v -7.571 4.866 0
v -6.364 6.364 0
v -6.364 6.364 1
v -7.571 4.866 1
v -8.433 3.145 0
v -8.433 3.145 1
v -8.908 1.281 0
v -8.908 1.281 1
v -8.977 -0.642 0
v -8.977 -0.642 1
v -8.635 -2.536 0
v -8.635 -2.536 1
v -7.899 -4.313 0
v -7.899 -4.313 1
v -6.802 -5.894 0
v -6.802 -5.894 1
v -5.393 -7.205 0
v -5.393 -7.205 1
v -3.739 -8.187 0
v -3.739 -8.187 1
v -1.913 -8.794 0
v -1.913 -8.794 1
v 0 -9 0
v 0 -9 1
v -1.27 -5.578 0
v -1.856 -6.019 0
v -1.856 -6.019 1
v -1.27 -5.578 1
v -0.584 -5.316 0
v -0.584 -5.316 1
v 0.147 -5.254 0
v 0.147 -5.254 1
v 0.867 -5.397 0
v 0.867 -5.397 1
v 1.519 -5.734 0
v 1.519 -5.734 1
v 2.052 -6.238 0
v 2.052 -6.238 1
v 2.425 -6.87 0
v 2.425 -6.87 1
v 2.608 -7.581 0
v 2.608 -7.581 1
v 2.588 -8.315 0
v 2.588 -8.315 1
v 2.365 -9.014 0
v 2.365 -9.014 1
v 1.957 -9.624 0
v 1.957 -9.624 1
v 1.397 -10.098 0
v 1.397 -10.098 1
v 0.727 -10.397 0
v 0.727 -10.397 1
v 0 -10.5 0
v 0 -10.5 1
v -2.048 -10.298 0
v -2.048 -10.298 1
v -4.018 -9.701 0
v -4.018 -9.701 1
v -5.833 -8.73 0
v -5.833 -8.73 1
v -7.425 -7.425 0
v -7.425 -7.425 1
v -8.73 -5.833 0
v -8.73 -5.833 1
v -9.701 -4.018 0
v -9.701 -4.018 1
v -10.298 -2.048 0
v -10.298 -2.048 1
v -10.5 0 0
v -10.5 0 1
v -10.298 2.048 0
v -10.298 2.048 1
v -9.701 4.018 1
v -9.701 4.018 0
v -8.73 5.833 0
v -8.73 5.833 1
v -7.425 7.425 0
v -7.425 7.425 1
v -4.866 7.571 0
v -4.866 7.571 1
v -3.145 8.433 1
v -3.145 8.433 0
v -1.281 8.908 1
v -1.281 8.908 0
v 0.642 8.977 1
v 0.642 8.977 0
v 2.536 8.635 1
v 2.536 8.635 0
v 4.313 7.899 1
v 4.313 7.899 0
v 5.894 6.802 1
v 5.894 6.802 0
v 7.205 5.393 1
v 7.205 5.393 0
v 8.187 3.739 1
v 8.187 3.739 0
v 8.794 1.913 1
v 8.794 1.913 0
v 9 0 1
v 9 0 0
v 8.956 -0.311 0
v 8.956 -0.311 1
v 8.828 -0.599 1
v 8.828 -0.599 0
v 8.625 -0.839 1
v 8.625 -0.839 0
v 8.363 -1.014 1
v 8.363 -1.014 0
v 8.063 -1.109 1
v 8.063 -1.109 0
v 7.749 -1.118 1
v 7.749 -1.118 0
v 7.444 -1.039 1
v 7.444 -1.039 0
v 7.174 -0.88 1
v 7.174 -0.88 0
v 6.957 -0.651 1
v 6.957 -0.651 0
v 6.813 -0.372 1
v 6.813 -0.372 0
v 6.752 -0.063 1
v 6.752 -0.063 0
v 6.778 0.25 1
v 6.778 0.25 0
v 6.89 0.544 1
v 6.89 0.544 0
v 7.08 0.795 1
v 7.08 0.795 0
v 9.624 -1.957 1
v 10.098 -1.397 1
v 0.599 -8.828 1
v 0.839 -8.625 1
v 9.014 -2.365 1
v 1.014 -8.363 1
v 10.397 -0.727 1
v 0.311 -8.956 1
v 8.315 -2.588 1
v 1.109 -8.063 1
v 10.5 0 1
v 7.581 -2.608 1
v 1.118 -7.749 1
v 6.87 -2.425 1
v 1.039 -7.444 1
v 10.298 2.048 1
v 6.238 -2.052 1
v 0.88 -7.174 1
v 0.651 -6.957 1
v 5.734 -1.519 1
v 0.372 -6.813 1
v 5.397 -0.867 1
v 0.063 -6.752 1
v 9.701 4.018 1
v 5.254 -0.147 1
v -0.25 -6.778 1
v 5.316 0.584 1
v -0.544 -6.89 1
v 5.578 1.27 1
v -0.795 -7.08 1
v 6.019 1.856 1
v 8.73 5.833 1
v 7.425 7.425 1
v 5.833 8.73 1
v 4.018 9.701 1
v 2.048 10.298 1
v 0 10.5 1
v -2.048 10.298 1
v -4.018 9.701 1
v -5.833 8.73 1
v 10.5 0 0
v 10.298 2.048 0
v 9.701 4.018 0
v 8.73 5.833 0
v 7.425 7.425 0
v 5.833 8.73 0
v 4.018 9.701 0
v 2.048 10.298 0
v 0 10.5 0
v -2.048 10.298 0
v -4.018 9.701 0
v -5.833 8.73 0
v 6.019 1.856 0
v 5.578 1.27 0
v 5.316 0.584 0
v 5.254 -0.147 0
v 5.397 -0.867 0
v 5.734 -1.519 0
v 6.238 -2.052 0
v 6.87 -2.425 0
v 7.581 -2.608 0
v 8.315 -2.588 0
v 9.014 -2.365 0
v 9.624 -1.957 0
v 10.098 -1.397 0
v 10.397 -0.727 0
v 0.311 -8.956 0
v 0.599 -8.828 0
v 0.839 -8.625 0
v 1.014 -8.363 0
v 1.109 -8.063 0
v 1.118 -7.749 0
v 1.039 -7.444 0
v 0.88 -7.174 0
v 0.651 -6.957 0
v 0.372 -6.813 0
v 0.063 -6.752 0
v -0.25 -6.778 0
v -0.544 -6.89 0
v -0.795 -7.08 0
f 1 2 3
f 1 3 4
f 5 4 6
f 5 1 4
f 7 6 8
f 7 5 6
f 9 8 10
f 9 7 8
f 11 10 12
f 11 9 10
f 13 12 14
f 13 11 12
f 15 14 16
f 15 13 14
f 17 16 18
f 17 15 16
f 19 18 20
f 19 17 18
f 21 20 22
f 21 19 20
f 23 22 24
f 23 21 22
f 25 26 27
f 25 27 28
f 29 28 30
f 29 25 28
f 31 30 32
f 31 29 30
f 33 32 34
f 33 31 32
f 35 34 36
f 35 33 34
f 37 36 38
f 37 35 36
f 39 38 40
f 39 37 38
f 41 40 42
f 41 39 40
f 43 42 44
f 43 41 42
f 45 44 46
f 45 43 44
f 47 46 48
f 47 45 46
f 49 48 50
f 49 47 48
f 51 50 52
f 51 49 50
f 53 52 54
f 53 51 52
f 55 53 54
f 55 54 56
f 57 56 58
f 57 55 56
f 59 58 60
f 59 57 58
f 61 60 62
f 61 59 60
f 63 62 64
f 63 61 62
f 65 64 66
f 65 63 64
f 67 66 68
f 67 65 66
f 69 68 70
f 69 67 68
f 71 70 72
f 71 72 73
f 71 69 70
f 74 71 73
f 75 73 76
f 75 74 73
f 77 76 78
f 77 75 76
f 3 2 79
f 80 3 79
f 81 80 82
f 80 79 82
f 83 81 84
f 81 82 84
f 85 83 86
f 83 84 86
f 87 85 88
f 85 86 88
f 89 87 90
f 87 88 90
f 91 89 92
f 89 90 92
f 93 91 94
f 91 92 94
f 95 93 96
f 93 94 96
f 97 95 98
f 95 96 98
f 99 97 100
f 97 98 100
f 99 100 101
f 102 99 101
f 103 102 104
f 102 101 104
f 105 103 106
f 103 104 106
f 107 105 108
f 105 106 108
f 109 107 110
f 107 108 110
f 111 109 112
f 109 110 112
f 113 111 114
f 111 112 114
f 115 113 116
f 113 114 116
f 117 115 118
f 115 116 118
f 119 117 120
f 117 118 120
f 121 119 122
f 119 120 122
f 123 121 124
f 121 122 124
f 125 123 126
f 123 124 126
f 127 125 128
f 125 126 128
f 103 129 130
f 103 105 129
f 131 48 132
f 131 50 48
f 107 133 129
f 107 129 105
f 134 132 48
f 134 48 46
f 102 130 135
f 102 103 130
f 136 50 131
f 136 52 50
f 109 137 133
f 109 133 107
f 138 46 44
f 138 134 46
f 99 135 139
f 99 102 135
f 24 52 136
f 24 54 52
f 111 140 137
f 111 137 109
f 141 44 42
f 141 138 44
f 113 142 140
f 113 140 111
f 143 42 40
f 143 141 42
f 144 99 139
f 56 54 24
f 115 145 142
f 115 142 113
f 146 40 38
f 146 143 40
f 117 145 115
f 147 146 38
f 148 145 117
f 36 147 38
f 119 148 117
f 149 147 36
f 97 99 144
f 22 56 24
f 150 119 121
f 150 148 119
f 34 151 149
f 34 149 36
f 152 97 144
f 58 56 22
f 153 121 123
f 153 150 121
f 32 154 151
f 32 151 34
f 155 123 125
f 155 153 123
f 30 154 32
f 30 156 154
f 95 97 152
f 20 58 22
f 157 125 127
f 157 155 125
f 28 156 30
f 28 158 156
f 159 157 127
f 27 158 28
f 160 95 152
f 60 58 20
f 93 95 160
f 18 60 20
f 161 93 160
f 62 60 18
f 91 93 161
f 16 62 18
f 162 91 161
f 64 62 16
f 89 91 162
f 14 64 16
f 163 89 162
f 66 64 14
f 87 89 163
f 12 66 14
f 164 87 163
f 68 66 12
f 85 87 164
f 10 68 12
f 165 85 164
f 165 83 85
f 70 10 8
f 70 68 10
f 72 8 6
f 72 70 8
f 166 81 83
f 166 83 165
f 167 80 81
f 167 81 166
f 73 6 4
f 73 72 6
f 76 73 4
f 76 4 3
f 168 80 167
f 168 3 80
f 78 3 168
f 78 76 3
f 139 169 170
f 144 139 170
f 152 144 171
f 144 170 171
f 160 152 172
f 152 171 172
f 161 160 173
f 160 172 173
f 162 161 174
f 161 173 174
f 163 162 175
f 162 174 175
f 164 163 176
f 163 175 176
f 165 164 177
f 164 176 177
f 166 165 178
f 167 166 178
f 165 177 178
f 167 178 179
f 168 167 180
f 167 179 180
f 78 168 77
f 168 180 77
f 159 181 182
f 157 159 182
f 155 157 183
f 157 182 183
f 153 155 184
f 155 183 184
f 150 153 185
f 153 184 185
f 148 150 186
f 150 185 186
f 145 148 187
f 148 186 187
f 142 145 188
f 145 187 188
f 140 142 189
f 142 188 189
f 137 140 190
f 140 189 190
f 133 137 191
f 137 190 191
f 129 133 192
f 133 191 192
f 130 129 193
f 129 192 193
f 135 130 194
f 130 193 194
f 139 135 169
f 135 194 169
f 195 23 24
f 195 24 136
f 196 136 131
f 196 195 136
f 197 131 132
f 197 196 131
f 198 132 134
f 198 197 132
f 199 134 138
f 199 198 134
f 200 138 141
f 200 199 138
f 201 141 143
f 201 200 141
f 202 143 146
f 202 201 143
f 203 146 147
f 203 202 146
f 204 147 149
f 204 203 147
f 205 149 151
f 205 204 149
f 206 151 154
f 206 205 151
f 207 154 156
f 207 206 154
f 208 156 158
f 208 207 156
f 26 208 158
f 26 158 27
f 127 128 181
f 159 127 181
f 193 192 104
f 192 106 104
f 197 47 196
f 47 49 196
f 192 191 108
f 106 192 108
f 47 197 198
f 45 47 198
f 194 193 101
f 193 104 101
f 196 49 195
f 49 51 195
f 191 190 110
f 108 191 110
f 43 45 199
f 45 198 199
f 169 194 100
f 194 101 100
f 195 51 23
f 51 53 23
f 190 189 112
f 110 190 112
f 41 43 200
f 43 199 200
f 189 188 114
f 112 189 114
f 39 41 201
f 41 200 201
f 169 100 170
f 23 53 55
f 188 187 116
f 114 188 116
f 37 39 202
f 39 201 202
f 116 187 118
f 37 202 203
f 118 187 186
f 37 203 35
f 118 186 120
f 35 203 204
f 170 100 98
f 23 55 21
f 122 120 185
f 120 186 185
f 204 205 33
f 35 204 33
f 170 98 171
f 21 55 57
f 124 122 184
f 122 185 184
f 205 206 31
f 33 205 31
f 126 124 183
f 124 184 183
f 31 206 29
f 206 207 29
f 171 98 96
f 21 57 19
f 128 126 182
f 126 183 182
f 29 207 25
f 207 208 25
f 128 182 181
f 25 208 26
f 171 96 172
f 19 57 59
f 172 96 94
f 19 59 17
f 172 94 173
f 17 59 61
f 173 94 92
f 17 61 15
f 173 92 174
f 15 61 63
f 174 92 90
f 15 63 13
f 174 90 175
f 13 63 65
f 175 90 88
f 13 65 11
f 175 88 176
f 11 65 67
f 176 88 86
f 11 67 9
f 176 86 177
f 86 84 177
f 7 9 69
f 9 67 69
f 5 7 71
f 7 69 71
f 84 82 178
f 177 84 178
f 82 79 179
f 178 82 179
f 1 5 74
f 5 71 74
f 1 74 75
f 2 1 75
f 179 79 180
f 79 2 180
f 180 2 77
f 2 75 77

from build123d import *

# Parameters (mm, degrees)
SALIENTE_EXTRUIR1_DEPTH = 1


with BuildPart() as part:
    # Croquis1 → Saliente-Extruir1 (new body)
    with BuildSketch(Plane.XY):
        with BuildLine():
            Line((-0.795495129, -7.079504871), (-1.856155301, -6.018844699))
            ThreePointArc((-1.856155301, -6.018844699), (2.425183773, -6.87045599), (0, -10.5))
            ThreePointArc((0, -10.5), (-9.700735091, -4.01817604), (-7.424621202, 7.424621202))
            Line((-7.424621202, 7.424621202), (-6.363961031, 6.363961031))
            ThreePointArc((-6.363961031, 6.363961031), (-8.314915793, -3.444150891), (0, -9))
            ThreePointArc((0, -9), (1.039364474, -7.444481139), (-0.795495129, -7.079504871))
        make_face()
    saliente_extruir1 = extrude(amount=SALIENTE_EXTRUIR1_DEPTH)

    # Simetría1: Saliente-Extruir1 across plane
    add(saliente_extruir1.mirror(Plane(origin=(-6.363961031, 6.363961031, 1), x_dir=(0, 0, 1), z_dir=(-0.7071067811865474, -0.7071067811865478, 0))))


solid = part.part
